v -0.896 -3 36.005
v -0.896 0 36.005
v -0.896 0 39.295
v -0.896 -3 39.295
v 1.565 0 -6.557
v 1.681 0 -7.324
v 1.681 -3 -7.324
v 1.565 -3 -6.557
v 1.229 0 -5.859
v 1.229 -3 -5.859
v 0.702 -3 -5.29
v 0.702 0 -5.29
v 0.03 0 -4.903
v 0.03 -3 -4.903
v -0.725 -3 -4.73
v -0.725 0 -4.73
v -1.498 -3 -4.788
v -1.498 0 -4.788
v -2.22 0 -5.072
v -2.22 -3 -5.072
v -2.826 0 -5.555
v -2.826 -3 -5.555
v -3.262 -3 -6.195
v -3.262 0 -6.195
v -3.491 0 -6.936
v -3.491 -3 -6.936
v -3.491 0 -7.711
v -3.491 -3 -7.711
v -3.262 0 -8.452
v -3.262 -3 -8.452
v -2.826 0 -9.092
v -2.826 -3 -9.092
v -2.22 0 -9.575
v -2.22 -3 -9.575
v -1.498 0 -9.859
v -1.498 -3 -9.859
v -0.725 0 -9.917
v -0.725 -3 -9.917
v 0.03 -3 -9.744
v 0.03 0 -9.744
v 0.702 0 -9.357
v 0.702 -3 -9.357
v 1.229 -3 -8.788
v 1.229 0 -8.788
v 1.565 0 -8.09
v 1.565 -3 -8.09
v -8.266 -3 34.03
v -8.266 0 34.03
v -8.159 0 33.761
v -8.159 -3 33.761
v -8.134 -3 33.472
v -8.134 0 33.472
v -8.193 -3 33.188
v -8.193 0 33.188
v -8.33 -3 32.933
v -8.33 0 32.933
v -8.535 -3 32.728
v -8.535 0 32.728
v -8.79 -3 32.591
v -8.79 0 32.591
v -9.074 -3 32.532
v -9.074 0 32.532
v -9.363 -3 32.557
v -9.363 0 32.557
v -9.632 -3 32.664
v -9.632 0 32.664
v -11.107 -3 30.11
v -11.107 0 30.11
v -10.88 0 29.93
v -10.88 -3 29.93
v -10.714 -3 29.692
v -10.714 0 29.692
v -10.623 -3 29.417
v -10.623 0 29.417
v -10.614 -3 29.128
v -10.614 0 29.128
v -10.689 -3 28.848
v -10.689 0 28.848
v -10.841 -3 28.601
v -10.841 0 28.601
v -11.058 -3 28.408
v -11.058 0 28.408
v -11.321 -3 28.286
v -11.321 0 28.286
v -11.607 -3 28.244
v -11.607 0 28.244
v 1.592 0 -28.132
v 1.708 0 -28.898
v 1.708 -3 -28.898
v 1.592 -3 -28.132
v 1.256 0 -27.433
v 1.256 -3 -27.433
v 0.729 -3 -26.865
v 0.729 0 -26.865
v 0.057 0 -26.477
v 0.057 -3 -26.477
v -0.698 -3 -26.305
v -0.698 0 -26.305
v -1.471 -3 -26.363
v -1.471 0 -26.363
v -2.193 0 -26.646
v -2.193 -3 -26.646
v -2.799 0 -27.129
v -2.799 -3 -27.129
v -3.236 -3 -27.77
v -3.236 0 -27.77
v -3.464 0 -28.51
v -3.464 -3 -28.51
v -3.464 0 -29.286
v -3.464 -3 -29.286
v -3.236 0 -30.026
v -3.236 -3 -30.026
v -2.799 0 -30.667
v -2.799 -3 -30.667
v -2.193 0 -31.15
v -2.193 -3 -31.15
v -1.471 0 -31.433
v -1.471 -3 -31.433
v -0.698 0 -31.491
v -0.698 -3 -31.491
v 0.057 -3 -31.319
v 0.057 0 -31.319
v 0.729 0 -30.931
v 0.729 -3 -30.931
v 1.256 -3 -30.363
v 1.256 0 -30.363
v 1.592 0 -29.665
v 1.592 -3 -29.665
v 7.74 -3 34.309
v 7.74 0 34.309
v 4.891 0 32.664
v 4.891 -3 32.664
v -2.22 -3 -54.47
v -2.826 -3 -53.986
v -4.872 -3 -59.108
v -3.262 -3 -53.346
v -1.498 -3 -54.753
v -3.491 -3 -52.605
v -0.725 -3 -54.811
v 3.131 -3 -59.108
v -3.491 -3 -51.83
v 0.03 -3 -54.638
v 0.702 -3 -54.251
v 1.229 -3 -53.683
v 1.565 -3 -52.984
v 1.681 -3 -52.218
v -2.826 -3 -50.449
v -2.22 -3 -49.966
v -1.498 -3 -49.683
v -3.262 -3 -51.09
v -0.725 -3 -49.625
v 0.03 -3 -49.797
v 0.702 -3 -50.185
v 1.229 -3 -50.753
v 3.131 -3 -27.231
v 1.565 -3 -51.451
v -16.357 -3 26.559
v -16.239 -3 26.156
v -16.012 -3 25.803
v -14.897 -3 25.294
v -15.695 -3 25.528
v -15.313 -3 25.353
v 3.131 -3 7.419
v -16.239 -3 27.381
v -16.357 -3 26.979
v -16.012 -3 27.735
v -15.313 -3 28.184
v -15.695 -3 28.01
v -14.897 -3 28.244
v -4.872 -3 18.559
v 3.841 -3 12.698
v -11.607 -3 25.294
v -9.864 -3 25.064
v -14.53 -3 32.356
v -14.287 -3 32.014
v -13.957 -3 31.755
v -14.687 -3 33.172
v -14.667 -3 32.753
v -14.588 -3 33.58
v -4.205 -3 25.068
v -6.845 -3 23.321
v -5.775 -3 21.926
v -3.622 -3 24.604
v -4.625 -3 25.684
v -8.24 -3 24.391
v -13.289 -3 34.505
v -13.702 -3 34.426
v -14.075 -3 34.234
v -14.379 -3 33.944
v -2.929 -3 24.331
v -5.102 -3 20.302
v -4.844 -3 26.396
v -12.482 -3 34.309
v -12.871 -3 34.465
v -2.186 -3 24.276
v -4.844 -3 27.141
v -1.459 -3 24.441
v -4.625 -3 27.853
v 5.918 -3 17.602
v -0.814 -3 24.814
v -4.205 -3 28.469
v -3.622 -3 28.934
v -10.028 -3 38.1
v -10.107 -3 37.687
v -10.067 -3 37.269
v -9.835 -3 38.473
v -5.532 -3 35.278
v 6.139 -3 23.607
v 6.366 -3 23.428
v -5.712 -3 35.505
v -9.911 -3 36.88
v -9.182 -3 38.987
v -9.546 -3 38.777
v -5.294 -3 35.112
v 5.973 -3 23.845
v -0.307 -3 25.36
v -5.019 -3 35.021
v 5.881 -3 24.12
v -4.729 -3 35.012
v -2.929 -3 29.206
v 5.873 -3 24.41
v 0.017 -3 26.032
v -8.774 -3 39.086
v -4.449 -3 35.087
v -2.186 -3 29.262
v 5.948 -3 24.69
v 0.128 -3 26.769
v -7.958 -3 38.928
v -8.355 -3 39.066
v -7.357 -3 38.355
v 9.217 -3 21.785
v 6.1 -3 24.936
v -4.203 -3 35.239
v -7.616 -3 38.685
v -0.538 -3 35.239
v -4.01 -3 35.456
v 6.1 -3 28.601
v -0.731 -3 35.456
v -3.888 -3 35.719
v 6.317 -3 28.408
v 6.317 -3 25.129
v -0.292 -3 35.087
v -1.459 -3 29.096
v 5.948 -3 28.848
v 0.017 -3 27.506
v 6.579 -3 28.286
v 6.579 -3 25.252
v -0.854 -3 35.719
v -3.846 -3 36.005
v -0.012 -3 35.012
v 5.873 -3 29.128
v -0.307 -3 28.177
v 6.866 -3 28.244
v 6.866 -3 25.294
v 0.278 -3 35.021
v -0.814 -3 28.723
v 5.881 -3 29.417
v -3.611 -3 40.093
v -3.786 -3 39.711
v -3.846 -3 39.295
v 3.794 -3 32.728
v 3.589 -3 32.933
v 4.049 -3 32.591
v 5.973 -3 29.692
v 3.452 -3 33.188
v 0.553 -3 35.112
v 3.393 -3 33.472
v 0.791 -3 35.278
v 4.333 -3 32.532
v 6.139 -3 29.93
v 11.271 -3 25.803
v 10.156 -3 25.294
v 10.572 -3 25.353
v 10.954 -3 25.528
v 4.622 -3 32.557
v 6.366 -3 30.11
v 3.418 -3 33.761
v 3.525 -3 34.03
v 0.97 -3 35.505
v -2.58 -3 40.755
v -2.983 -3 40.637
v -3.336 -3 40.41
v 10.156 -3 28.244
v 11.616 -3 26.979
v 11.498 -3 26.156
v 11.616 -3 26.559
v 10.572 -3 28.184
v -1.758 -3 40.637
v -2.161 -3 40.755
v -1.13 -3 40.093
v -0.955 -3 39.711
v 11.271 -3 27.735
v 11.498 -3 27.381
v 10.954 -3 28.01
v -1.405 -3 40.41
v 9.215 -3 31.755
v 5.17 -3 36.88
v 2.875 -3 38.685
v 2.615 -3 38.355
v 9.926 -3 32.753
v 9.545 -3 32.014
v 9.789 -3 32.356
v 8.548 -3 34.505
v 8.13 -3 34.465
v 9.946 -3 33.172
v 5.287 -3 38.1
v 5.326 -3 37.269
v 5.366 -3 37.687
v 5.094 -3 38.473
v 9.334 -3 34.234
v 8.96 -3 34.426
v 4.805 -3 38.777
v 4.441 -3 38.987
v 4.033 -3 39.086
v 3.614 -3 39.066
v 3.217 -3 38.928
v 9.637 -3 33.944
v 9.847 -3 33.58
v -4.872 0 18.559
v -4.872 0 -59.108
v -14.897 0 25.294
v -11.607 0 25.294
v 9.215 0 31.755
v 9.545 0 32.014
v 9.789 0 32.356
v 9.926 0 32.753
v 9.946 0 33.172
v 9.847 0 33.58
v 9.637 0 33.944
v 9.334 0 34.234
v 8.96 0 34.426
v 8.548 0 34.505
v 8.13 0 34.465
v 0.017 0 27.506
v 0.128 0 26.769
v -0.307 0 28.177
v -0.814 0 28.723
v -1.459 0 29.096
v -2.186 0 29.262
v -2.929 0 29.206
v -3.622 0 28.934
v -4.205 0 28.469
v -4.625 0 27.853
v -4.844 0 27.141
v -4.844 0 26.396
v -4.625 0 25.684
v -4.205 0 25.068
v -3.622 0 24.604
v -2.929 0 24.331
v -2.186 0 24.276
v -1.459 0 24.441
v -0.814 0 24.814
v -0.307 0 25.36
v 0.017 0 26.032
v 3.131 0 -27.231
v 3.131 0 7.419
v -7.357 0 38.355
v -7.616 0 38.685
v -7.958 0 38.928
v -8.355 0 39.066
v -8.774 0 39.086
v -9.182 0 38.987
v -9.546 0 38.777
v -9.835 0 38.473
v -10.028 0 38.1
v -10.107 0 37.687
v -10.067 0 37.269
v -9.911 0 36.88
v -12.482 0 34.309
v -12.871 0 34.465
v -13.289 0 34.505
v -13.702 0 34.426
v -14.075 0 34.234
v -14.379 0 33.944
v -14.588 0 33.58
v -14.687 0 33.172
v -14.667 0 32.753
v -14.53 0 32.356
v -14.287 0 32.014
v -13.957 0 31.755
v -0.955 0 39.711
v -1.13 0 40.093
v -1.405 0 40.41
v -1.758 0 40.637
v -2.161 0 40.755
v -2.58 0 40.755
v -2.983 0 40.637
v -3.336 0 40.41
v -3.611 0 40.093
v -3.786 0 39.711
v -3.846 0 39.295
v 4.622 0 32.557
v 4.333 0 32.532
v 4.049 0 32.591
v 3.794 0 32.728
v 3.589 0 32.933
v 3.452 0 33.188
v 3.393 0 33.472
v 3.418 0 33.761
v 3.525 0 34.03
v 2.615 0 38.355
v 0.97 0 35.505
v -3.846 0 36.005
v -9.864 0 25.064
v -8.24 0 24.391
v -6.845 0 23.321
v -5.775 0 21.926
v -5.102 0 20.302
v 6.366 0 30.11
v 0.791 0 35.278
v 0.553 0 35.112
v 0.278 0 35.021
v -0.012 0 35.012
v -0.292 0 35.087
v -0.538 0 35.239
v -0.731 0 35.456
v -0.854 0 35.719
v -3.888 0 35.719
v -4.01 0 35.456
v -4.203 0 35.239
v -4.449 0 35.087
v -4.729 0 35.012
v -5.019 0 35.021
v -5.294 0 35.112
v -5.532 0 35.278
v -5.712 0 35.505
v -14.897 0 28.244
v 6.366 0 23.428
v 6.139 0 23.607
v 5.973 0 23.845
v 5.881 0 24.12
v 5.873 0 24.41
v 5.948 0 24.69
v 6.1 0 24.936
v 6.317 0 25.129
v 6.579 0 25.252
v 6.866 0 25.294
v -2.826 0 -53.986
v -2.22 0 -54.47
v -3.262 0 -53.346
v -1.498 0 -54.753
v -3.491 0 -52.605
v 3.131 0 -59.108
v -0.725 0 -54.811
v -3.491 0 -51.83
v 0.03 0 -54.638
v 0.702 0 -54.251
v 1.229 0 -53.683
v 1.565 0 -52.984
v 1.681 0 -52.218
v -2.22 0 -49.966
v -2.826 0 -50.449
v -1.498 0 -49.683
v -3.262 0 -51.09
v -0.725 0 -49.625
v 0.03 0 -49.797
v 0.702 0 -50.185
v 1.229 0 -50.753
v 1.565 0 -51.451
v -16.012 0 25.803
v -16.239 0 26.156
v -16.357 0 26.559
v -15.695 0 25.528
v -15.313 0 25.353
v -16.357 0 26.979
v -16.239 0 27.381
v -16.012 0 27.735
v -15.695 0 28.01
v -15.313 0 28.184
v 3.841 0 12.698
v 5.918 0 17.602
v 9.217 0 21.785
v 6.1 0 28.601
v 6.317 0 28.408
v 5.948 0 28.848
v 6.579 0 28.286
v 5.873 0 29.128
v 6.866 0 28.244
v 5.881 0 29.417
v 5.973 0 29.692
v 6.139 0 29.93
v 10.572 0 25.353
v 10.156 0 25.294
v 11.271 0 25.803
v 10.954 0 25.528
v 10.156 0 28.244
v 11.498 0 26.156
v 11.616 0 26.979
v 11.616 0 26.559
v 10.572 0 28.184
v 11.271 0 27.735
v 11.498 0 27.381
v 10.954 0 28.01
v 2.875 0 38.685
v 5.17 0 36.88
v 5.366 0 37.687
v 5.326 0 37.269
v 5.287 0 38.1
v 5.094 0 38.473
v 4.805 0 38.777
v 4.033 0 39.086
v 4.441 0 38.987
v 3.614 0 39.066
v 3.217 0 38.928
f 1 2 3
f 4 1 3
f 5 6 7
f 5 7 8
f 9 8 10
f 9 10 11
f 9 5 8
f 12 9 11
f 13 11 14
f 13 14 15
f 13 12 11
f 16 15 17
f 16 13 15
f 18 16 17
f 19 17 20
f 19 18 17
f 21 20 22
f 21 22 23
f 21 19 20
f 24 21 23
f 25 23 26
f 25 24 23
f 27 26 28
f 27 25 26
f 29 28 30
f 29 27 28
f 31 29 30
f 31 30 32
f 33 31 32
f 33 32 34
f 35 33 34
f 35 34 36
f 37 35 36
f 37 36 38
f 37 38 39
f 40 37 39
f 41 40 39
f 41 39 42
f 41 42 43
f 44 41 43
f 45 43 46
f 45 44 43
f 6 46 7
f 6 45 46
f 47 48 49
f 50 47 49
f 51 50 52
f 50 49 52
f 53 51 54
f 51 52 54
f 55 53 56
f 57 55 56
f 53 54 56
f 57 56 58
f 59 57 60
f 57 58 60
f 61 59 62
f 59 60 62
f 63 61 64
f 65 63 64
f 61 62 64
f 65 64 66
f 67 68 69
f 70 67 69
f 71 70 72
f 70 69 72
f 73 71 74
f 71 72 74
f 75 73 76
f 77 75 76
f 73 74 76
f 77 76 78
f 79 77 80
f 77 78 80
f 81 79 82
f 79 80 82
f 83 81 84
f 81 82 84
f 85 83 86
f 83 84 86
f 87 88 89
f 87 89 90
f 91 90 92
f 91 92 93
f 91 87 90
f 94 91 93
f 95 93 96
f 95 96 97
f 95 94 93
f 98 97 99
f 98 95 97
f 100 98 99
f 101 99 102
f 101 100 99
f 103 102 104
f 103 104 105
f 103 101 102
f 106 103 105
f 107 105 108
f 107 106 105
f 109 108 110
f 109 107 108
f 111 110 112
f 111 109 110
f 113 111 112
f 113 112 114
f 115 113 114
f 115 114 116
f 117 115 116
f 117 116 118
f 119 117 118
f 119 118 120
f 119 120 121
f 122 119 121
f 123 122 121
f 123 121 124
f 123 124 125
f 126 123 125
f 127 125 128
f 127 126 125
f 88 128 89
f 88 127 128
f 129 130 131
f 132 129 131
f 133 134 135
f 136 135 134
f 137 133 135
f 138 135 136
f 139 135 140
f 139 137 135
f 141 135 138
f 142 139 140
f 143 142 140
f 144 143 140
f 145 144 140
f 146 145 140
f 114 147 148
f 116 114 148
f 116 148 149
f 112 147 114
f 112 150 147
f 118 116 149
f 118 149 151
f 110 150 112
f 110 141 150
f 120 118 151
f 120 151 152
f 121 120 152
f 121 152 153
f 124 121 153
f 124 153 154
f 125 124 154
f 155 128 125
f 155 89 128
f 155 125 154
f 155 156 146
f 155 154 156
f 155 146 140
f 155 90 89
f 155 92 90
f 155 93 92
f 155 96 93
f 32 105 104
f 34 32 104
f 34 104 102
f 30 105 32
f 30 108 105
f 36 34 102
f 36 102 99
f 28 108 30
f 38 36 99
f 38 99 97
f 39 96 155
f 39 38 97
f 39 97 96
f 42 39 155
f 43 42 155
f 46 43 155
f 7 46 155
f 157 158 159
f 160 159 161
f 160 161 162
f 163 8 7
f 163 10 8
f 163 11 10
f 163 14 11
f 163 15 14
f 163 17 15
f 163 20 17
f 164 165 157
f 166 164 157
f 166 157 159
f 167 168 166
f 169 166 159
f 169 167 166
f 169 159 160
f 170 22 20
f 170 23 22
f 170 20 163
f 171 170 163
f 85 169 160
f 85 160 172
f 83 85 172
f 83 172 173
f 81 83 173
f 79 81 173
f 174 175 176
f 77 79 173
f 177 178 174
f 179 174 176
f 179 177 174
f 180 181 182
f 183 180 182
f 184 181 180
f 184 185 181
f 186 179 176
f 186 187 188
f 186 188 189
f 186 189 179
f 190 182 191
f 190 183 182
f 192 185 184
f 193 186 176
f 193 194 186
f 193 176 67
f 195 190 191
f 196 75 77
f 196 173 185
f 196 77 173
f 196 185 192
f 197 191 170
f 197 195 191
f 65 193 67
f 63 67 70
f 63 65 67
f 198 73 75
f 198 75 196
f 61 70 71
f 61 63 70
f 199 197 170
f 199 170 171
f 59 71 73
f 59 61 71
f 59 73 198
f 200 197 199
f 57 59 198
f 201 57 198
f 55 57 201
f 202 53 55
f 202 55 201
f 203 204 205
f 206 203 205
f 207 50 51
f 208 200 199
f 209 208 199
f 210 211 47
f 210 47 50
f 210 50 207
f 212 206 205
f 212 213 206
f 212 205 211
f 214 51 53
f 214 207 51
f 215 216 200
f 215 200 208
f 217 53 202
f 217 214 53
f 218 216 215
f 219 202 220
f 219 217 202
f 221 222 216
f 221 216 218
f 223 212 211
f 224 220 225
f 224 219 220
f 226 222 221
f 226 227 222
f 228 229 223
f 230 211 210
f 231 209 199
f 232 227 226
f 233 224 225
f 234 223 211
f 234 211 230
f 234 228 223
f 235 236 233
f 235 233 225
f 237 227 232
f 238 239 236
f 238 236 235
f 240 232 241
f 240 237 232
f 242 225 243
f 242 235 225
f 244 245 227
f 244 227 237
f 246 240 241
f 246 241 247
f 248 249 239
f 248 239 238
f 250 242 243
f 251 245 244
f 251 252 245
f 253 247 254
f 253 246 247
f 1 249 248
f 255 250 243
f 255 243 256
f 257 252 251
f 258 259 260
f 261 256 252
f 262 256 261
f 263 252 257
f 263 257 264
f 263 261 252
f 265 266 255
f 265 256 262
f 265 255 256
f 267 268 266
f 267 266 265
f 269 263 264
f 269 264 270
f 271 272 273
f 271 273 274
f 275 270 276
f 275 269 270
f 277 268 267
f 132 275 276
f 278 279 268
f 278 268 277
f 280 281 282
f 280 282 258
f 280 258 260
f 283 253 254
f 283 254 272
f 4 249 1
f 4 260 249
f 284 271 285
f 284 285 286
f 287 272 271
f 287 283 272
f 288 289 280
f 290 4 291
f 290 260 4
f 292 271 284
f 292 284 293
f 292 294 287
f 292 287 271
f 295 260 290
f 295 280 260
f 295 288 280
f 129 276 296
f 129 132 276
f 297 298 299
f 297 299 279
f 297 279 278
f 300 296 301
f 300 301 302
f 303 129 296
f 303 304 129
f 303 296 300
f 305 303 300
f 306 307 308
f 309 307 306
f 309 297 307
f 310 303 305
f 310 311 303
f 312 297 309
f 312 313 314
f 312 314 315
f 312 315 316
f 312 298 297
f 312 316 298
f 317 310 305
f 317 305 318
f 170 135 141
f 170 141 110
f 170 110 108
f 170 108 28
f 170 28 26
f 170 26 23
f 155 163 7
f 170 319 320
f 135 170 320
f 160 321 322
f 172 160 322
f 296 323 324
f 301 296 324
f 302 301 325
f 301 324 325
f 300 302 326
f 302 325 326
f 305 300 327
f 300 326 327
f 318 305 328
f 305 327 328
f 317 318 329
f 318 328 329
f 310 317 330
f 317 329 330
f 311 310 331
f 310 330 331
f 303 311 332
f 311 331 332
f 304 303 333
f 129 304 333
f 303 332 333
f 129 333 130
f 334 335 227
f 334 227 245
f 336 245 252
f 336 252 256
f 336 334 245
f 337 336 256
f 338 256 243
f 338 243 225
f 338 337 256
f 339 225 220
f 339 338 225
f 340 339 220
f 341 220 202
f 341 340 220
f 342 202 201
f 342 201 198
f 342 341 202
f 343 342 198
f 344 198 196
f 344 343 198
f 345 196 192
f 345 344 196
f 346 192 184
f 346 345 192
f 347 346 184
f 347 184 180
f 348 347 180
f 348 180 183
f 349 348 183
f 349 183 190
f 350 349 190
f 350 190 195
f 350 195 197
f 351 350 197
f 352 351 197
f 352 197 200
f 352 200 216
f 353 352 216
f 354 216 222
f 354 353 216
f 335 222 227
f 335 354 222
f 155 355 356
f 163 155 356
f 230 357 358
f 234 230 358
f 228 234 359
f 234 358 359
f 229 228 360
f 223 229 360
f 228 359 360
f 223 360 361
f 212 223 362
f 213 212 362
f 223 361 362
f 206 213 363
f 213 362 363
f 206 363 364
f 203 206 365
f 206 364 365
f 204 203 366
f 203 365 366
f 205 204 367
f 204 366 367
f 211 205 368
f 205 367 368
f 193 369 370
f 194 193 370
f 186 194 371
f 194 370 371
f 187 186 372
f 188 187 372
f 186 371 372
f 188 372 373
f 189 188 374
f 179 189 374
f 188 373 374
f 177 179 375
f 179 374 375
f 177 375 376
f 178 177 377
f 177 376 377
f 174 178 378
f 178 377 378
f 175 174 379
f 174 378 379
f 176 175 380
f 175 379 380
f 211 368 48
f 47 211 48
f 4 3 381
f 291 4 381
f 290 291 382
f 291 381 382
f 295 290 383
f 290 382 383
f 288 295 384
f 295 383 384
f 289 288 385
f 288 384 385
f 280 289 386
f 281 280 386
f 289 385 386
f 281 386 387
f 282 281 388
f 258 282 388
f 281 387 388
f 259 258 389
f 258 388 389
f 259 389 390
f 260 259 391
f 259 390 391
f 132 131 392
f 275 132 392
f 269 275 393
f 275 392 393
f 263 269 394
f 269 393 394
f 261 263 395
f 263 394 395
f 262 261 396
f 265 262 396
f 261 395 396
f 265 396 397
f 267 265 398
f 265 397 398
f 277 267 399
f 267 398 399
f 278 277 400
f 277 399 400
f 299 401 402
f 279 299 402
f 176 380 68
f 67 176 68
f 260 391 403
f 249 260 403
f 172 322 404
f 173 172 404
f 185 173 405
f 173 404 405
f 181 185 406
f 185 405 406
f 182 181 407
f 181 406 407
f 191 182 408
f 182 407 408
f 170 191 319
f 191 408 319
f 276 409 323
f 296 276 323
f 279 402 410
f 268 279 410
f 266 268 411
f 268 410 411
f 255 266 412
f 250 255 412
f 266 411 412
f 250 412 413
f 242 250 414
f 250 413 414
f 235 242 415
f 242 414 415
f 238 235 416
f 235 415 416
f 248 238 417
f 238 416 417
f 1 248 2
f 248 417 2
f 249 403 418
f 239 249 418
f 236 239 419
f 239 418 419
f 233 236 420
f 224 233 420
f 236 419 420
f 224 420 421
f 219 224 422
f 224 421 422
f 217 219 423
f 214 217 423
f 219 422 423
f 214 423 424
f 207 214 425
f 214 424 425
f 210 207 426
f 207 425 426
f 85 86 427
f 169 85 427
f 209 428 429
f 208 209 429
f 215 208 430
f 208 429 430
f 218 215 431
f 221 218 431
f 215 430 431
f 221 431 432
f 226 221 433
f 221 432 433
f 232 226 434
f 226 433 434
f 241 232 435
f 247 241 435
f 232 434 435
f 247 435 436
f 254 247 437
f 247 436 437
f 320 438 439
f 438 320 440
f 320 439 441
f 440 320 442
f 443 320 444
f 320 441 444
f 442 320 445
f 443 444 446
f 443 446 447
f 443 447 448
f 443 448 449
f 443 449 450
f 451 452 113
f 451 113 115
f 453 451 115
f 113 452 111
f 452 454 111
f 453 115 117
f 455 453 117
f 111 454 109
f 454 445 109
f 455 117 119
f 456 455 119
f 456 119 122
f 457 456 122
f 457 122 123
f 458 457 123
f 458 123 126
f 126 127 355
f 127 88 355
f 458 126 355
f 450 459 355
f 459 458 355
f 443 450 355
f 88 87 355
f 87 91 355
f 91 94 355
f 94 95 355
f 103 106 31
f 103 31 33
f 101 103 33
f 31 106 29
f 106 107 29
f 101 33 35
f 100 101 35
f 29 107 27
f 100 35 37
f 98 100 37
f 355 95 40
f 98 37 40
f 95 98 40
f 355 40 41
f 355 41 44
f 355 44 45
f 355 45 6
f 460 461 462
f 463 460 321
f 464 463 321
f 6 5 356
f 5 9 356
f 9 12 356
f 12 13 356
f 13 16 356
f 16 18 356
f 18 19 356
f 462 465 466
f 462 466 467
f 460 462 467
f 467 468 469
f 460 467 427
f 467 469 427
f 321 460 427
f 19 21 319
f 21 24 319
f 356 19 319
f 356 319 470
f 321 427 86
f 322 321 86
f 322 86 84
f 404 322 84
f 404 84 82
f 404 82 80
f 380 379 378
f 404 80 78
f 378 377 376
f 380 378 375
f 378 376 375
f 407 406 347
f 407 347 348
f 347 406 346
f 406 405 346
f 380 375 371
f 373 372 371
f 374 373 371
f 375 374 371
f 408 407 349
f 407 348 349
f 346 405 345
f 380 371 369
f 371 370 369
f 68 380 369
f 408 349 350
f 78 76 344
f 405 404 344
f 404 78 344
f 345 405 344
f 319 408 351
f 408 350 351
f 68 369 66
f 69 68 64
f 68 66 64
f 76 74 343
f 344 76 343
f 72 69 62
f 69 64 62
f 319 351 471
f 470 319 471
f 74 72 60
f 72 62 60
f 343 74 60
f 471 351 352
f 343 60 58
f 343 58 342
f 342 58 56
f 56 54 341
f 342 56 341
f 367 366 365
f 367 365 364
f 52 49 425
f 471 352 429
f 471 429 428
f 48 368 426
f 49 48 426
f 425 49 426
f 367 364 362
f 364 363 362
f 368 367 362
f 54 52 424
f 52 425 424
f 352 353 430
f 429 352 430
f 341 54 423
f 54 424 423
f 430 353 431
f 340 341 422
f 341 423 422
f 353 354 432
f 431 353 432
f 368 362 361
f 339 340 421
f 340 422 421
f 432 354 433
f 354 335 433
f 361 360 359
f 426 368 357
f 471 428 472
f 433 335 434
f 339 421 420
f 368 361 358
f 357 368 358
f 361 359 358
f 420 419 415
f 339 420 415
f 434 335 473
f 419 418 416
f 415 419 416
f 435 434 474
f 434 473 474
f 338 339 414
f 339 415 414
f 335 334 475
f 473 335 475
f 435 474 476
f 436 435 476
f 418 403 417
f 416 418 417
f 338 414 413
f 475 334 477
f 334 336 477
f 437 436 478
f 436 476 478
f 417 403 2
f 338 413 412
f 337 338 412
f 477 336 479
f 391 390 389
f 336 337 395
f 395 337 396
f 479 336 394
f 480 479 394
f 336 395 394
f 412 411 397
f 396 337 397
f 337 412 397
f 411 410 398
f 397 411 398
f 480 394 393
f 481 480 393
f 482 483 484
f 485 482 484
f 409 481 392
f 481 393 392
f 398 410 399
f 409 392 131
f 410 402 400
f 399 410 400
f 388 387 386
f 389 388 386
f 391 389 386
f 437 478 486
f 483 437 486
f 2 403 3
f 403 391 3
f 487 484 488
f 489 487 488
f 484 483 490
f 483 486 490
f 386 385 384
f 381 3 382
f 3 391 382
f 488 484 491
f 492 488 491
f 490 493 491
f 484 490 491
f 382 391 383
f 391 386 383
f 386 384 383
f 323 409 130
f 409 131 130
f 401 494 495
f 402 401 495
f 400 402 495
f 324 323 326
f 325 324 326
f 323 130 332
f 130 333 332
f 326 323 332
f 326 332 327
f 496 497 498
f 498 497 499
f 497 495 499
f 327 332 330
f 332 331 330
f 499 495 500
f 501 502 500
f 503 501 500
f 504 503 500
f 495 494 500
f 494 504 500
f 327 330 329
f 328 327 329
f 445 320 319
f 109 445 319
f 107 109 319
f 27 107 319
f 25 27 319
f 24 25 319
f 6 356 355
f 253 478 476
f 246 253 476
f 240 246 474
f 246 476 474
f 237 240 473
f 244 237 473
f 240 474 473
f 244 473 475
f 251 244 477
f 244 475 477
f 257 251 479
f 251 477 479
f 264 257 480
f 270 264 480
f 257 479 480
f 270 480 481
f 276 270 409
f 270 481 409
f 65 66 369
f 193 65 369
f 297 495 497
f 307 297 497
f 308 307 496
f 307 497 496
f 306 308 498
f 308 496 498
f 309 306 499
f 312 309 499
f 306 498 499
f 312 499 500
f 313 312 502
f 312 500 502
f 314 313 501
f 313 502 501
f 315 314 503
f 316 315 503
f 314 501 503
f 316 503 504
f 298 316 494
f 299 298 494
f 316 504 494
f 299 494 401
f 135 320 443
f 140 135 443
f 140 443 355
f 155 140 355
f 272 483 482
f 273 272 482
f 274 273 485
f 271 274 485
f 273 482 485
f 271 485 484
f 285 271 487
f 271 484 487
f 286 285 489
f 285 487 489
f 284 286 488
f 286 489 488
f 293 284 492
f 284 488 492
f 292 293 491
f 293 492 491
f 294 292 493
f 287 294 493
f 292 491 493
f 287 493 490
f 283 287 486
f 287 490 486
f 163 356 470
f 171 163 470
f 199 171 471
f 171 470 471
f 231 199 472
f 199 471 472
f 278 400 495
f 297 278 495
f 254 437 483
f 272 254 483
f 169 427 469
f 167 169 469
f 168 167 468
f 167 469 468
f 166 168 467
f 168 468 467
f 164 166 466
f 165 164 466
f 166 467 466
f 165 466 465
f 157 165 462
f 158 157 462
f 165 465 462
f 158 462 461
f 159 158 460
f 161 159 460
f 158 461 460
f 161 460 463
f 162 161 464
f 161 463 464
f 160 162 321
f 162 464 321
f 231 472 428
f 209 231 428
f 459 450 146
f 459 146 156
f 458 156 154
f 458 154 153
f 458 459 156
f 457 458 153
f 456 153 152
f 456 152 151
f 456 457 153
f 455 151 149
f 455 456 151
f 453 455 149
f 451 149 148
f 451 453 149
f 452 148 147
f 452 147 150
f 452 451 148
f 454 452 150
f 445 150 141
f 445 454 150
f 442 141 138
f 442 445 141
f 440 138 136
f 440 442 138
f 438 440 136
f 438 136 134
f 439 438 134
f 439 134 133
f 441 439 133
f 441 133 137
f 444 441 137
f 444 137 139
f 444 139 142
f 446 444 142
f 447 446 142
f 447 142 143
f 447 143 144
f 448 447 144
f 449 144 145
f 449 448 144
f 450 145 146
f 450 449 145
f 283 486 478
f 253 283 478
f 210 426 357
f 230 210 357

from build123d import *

# Parameters (mm, degrees)
F0_R     = 2.600347
F0_R_2   = 2.5
F1_DEPTH = 3


with BuildPart() as f1:
    # F0 (on Front) → F1 (new body)
    with BuildSketch(Plane.XZ):
        with BuildLine():
            ThreePointArc((-11.107391, 30.109689), (-10.641465, 28.984844), (-11.607391, 28.243663))
            Line((-11.607391, 28.243663), (-14.897391, 28.243663))
            ThreePointArc((-14.897391, 28.243663), (-16.372391, 26.768663), (-14.897391, 25.293663))
            Line((-14.897391, 25.293663), (-11.607391, 25.293663))
            ThreePointArc((-11.607391, 25.293663), (-6.845027, 23.321027), (-4.872391, 18.558663))
            Line((-4.872391, 18.558663), (-4.872391, -27.230971))
            Line((-4.872391, -27.230971), (-4.872391, -59.108431))
            Line((-4.872391, -59.108431), (3.131261, -59.108431))
            Line((3.131261, -59.108431), (3.131261, -27.230971))
            Line((3.131261, -27.230971), (3.13126, 7.418663))
            ThreePointArc((3.13126, 7.418663), (4.715363, 15.219607), (9.216732, 21.784801))
            Line((9.216732, 21.784801), (6.36626, 23.427638))
            ThreePointArc((6.36626, 23.427638), (5.900335, 24.552482), (6.86626, 25.293663))
            Line((6.86626, 25.293663), (10.15626, 25.293663))
            ThreePointArc((10.15626, 25.293663), (11.63126, 26.768663), (10.15626, 28.243663))
            Line((10.15626, 28.243663), (6.86626, 28.243663))
            ThreePointArc((6.86626, 28.243663), (5.900335, 28.984844), (6.36626, 30.109689))
            Line((6.36626, 30.109689), (9.215484, 31.754689))
            ThreePointArc((9.215484, 31.754689), (9.755372, 33.769576), (7.740484, 34.309464))
            Line((7.740484, 34.309464), (4.89126, 32.664464))
            ThreePointArc((4.89126, 32.664464), (3.684154, 32.823382), (3.525235, 34.030489))
            Line((3.525235, 34.030489), (5.170235, 36.879713))
            ThreePointArc((5.170235, 36.879713), (4.630348, 38.8946), (2.61546, 38.354713))
            Line((2.61546, 38.354713), (0.97046, 35.505489))
            ThreePointArc((0.97046, 35.505489), (-0.154384, 35.039563), (-0.895565, 36.005489))
            Line((-0.895565, 36.005489), (-0.895565, 39.295489))
            ThreePointArc((-0.895565, 39.295489), (-2.370565, 40.770489), (-3.845565, 39.295489))
            Line((-3.845565, 39.295489), (-3.845565, 36.005489))
            ThreePointArc((-3.845565, 36.005489), (-4.586746, 35.039563), (-5.711591, 35.505489))
            Line((-5.711591, 35.505489), (-7.356591, 38.354713))
            ThreePointArc((-7.356591, 38.354713), (-9.371478, 38.8946), (-9.911366, 36.879713))
            Line((-9.911366, 36.879713), (-8.266366, 34.030489))
            ThreePointArc((-8.266366, 34.030489), (-8.425284, 32.823382), (-9.632391, 32.664464))
            Line((-9.632391, 32.664464), (-12.481615, 34.309464))
            ThreePointArc((-12.481615, 34.309464), (-14.496502, 33.769576), (-13.956615, 31.754689))
            Line((-13.956615, 31.754689), (-11.107391, 30.109689))
        make_face()
        with Locations((-0.91964, -52.217755)):
            Circle(F0_R, mode=Mode.SUBTRACT)
        with Locations((-0.892788, -28.898051)):
            Circle(F0_R, mode=Mode.SUBTRACT)
        with Locations((-2.372391, 26.768663)):
            Circle(F0_R_2, mode=Mode.SUBTRACT)
        with Locations((-0.91964, -7.323526)):
            Circle(F0_R, mode=Mode.SUBTRACT)
    extrude(amount=F1_DEPTH)


solid = f1.part
